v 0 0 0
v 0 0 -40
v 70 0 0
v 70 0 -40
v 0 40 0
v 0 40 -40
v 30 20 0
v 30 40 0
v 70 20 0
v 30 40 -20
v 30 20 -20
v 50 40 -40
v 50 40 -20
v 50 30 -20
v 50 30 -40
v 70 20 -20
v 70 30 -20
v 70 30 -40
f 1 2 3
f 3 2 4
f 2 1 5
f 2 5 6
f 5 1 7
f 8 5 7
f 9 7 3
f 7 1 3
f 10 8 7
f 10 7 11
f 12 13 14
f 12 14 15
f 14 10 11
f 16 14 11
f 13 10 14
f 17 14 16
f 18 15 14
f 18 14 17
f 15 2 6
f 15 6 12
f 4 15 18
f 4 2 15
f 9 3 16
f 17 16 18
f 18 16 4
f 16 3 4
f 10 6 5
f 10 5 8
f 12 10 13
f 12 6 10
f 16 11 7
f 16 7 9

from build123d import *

# Parameters (mm, degrees)
SKETCH_1_W          = 70
SKETCH_1_H          = 40
EXTRUDE_1_DEPTH     = 40
SKETCH_2_W          = 20
SKETCH_2_H          = 20
CUT_EXTRUDE_1_DEPTH = 10
SKETCH_3_W          = 40
SKETCH_3_H          = 20
CUT_EXTRUDE_2_DEPTH = 20


with BuildPart() as part:
    # 스케치1 → 보스-돌출1 (new body)
    with BuildSketch(Plane(origin=(0, 0, 0), x_dir=(1, 0, 0), z_dir=(0, 1, 0))):
        with Locations((35, 20)):
            Rectangle(SKETCH_1_W, SKETCH_1_H)
    extrude(amount=EXTRUDE_1_DEPTH)

    # 스케치2 → 컷-돌출1 (cut)
    with BuildSketch(Plane(origin=(0, 40, 0), x_dir=(1, 0, 0), z_dir=(0, 1, 0))):
        with Locations((60, 30)):
            Rectangle(SKETCH_2_W, SKETCH_2_H)
    extrude(amount=-CUT_EXTRUDE_1_DEPTH, mode=Mode.SUBTRACT)

    # 스케치3 → 컷-돌출2 (cut)
    with BuildSketch(Plane(origin=(0, 40, 0), x_dir=(1, 0, 0), z_dir=(0, 1, 0))):
        with Locations((50, 10)):
            Rectangle(SKETCH_3_W, SKETCH_3_H)
    extrude(amount=-CUT_EXTRUDE_2_DEPTH, mode=Mode.SUBTRACT)


solid = part.part
